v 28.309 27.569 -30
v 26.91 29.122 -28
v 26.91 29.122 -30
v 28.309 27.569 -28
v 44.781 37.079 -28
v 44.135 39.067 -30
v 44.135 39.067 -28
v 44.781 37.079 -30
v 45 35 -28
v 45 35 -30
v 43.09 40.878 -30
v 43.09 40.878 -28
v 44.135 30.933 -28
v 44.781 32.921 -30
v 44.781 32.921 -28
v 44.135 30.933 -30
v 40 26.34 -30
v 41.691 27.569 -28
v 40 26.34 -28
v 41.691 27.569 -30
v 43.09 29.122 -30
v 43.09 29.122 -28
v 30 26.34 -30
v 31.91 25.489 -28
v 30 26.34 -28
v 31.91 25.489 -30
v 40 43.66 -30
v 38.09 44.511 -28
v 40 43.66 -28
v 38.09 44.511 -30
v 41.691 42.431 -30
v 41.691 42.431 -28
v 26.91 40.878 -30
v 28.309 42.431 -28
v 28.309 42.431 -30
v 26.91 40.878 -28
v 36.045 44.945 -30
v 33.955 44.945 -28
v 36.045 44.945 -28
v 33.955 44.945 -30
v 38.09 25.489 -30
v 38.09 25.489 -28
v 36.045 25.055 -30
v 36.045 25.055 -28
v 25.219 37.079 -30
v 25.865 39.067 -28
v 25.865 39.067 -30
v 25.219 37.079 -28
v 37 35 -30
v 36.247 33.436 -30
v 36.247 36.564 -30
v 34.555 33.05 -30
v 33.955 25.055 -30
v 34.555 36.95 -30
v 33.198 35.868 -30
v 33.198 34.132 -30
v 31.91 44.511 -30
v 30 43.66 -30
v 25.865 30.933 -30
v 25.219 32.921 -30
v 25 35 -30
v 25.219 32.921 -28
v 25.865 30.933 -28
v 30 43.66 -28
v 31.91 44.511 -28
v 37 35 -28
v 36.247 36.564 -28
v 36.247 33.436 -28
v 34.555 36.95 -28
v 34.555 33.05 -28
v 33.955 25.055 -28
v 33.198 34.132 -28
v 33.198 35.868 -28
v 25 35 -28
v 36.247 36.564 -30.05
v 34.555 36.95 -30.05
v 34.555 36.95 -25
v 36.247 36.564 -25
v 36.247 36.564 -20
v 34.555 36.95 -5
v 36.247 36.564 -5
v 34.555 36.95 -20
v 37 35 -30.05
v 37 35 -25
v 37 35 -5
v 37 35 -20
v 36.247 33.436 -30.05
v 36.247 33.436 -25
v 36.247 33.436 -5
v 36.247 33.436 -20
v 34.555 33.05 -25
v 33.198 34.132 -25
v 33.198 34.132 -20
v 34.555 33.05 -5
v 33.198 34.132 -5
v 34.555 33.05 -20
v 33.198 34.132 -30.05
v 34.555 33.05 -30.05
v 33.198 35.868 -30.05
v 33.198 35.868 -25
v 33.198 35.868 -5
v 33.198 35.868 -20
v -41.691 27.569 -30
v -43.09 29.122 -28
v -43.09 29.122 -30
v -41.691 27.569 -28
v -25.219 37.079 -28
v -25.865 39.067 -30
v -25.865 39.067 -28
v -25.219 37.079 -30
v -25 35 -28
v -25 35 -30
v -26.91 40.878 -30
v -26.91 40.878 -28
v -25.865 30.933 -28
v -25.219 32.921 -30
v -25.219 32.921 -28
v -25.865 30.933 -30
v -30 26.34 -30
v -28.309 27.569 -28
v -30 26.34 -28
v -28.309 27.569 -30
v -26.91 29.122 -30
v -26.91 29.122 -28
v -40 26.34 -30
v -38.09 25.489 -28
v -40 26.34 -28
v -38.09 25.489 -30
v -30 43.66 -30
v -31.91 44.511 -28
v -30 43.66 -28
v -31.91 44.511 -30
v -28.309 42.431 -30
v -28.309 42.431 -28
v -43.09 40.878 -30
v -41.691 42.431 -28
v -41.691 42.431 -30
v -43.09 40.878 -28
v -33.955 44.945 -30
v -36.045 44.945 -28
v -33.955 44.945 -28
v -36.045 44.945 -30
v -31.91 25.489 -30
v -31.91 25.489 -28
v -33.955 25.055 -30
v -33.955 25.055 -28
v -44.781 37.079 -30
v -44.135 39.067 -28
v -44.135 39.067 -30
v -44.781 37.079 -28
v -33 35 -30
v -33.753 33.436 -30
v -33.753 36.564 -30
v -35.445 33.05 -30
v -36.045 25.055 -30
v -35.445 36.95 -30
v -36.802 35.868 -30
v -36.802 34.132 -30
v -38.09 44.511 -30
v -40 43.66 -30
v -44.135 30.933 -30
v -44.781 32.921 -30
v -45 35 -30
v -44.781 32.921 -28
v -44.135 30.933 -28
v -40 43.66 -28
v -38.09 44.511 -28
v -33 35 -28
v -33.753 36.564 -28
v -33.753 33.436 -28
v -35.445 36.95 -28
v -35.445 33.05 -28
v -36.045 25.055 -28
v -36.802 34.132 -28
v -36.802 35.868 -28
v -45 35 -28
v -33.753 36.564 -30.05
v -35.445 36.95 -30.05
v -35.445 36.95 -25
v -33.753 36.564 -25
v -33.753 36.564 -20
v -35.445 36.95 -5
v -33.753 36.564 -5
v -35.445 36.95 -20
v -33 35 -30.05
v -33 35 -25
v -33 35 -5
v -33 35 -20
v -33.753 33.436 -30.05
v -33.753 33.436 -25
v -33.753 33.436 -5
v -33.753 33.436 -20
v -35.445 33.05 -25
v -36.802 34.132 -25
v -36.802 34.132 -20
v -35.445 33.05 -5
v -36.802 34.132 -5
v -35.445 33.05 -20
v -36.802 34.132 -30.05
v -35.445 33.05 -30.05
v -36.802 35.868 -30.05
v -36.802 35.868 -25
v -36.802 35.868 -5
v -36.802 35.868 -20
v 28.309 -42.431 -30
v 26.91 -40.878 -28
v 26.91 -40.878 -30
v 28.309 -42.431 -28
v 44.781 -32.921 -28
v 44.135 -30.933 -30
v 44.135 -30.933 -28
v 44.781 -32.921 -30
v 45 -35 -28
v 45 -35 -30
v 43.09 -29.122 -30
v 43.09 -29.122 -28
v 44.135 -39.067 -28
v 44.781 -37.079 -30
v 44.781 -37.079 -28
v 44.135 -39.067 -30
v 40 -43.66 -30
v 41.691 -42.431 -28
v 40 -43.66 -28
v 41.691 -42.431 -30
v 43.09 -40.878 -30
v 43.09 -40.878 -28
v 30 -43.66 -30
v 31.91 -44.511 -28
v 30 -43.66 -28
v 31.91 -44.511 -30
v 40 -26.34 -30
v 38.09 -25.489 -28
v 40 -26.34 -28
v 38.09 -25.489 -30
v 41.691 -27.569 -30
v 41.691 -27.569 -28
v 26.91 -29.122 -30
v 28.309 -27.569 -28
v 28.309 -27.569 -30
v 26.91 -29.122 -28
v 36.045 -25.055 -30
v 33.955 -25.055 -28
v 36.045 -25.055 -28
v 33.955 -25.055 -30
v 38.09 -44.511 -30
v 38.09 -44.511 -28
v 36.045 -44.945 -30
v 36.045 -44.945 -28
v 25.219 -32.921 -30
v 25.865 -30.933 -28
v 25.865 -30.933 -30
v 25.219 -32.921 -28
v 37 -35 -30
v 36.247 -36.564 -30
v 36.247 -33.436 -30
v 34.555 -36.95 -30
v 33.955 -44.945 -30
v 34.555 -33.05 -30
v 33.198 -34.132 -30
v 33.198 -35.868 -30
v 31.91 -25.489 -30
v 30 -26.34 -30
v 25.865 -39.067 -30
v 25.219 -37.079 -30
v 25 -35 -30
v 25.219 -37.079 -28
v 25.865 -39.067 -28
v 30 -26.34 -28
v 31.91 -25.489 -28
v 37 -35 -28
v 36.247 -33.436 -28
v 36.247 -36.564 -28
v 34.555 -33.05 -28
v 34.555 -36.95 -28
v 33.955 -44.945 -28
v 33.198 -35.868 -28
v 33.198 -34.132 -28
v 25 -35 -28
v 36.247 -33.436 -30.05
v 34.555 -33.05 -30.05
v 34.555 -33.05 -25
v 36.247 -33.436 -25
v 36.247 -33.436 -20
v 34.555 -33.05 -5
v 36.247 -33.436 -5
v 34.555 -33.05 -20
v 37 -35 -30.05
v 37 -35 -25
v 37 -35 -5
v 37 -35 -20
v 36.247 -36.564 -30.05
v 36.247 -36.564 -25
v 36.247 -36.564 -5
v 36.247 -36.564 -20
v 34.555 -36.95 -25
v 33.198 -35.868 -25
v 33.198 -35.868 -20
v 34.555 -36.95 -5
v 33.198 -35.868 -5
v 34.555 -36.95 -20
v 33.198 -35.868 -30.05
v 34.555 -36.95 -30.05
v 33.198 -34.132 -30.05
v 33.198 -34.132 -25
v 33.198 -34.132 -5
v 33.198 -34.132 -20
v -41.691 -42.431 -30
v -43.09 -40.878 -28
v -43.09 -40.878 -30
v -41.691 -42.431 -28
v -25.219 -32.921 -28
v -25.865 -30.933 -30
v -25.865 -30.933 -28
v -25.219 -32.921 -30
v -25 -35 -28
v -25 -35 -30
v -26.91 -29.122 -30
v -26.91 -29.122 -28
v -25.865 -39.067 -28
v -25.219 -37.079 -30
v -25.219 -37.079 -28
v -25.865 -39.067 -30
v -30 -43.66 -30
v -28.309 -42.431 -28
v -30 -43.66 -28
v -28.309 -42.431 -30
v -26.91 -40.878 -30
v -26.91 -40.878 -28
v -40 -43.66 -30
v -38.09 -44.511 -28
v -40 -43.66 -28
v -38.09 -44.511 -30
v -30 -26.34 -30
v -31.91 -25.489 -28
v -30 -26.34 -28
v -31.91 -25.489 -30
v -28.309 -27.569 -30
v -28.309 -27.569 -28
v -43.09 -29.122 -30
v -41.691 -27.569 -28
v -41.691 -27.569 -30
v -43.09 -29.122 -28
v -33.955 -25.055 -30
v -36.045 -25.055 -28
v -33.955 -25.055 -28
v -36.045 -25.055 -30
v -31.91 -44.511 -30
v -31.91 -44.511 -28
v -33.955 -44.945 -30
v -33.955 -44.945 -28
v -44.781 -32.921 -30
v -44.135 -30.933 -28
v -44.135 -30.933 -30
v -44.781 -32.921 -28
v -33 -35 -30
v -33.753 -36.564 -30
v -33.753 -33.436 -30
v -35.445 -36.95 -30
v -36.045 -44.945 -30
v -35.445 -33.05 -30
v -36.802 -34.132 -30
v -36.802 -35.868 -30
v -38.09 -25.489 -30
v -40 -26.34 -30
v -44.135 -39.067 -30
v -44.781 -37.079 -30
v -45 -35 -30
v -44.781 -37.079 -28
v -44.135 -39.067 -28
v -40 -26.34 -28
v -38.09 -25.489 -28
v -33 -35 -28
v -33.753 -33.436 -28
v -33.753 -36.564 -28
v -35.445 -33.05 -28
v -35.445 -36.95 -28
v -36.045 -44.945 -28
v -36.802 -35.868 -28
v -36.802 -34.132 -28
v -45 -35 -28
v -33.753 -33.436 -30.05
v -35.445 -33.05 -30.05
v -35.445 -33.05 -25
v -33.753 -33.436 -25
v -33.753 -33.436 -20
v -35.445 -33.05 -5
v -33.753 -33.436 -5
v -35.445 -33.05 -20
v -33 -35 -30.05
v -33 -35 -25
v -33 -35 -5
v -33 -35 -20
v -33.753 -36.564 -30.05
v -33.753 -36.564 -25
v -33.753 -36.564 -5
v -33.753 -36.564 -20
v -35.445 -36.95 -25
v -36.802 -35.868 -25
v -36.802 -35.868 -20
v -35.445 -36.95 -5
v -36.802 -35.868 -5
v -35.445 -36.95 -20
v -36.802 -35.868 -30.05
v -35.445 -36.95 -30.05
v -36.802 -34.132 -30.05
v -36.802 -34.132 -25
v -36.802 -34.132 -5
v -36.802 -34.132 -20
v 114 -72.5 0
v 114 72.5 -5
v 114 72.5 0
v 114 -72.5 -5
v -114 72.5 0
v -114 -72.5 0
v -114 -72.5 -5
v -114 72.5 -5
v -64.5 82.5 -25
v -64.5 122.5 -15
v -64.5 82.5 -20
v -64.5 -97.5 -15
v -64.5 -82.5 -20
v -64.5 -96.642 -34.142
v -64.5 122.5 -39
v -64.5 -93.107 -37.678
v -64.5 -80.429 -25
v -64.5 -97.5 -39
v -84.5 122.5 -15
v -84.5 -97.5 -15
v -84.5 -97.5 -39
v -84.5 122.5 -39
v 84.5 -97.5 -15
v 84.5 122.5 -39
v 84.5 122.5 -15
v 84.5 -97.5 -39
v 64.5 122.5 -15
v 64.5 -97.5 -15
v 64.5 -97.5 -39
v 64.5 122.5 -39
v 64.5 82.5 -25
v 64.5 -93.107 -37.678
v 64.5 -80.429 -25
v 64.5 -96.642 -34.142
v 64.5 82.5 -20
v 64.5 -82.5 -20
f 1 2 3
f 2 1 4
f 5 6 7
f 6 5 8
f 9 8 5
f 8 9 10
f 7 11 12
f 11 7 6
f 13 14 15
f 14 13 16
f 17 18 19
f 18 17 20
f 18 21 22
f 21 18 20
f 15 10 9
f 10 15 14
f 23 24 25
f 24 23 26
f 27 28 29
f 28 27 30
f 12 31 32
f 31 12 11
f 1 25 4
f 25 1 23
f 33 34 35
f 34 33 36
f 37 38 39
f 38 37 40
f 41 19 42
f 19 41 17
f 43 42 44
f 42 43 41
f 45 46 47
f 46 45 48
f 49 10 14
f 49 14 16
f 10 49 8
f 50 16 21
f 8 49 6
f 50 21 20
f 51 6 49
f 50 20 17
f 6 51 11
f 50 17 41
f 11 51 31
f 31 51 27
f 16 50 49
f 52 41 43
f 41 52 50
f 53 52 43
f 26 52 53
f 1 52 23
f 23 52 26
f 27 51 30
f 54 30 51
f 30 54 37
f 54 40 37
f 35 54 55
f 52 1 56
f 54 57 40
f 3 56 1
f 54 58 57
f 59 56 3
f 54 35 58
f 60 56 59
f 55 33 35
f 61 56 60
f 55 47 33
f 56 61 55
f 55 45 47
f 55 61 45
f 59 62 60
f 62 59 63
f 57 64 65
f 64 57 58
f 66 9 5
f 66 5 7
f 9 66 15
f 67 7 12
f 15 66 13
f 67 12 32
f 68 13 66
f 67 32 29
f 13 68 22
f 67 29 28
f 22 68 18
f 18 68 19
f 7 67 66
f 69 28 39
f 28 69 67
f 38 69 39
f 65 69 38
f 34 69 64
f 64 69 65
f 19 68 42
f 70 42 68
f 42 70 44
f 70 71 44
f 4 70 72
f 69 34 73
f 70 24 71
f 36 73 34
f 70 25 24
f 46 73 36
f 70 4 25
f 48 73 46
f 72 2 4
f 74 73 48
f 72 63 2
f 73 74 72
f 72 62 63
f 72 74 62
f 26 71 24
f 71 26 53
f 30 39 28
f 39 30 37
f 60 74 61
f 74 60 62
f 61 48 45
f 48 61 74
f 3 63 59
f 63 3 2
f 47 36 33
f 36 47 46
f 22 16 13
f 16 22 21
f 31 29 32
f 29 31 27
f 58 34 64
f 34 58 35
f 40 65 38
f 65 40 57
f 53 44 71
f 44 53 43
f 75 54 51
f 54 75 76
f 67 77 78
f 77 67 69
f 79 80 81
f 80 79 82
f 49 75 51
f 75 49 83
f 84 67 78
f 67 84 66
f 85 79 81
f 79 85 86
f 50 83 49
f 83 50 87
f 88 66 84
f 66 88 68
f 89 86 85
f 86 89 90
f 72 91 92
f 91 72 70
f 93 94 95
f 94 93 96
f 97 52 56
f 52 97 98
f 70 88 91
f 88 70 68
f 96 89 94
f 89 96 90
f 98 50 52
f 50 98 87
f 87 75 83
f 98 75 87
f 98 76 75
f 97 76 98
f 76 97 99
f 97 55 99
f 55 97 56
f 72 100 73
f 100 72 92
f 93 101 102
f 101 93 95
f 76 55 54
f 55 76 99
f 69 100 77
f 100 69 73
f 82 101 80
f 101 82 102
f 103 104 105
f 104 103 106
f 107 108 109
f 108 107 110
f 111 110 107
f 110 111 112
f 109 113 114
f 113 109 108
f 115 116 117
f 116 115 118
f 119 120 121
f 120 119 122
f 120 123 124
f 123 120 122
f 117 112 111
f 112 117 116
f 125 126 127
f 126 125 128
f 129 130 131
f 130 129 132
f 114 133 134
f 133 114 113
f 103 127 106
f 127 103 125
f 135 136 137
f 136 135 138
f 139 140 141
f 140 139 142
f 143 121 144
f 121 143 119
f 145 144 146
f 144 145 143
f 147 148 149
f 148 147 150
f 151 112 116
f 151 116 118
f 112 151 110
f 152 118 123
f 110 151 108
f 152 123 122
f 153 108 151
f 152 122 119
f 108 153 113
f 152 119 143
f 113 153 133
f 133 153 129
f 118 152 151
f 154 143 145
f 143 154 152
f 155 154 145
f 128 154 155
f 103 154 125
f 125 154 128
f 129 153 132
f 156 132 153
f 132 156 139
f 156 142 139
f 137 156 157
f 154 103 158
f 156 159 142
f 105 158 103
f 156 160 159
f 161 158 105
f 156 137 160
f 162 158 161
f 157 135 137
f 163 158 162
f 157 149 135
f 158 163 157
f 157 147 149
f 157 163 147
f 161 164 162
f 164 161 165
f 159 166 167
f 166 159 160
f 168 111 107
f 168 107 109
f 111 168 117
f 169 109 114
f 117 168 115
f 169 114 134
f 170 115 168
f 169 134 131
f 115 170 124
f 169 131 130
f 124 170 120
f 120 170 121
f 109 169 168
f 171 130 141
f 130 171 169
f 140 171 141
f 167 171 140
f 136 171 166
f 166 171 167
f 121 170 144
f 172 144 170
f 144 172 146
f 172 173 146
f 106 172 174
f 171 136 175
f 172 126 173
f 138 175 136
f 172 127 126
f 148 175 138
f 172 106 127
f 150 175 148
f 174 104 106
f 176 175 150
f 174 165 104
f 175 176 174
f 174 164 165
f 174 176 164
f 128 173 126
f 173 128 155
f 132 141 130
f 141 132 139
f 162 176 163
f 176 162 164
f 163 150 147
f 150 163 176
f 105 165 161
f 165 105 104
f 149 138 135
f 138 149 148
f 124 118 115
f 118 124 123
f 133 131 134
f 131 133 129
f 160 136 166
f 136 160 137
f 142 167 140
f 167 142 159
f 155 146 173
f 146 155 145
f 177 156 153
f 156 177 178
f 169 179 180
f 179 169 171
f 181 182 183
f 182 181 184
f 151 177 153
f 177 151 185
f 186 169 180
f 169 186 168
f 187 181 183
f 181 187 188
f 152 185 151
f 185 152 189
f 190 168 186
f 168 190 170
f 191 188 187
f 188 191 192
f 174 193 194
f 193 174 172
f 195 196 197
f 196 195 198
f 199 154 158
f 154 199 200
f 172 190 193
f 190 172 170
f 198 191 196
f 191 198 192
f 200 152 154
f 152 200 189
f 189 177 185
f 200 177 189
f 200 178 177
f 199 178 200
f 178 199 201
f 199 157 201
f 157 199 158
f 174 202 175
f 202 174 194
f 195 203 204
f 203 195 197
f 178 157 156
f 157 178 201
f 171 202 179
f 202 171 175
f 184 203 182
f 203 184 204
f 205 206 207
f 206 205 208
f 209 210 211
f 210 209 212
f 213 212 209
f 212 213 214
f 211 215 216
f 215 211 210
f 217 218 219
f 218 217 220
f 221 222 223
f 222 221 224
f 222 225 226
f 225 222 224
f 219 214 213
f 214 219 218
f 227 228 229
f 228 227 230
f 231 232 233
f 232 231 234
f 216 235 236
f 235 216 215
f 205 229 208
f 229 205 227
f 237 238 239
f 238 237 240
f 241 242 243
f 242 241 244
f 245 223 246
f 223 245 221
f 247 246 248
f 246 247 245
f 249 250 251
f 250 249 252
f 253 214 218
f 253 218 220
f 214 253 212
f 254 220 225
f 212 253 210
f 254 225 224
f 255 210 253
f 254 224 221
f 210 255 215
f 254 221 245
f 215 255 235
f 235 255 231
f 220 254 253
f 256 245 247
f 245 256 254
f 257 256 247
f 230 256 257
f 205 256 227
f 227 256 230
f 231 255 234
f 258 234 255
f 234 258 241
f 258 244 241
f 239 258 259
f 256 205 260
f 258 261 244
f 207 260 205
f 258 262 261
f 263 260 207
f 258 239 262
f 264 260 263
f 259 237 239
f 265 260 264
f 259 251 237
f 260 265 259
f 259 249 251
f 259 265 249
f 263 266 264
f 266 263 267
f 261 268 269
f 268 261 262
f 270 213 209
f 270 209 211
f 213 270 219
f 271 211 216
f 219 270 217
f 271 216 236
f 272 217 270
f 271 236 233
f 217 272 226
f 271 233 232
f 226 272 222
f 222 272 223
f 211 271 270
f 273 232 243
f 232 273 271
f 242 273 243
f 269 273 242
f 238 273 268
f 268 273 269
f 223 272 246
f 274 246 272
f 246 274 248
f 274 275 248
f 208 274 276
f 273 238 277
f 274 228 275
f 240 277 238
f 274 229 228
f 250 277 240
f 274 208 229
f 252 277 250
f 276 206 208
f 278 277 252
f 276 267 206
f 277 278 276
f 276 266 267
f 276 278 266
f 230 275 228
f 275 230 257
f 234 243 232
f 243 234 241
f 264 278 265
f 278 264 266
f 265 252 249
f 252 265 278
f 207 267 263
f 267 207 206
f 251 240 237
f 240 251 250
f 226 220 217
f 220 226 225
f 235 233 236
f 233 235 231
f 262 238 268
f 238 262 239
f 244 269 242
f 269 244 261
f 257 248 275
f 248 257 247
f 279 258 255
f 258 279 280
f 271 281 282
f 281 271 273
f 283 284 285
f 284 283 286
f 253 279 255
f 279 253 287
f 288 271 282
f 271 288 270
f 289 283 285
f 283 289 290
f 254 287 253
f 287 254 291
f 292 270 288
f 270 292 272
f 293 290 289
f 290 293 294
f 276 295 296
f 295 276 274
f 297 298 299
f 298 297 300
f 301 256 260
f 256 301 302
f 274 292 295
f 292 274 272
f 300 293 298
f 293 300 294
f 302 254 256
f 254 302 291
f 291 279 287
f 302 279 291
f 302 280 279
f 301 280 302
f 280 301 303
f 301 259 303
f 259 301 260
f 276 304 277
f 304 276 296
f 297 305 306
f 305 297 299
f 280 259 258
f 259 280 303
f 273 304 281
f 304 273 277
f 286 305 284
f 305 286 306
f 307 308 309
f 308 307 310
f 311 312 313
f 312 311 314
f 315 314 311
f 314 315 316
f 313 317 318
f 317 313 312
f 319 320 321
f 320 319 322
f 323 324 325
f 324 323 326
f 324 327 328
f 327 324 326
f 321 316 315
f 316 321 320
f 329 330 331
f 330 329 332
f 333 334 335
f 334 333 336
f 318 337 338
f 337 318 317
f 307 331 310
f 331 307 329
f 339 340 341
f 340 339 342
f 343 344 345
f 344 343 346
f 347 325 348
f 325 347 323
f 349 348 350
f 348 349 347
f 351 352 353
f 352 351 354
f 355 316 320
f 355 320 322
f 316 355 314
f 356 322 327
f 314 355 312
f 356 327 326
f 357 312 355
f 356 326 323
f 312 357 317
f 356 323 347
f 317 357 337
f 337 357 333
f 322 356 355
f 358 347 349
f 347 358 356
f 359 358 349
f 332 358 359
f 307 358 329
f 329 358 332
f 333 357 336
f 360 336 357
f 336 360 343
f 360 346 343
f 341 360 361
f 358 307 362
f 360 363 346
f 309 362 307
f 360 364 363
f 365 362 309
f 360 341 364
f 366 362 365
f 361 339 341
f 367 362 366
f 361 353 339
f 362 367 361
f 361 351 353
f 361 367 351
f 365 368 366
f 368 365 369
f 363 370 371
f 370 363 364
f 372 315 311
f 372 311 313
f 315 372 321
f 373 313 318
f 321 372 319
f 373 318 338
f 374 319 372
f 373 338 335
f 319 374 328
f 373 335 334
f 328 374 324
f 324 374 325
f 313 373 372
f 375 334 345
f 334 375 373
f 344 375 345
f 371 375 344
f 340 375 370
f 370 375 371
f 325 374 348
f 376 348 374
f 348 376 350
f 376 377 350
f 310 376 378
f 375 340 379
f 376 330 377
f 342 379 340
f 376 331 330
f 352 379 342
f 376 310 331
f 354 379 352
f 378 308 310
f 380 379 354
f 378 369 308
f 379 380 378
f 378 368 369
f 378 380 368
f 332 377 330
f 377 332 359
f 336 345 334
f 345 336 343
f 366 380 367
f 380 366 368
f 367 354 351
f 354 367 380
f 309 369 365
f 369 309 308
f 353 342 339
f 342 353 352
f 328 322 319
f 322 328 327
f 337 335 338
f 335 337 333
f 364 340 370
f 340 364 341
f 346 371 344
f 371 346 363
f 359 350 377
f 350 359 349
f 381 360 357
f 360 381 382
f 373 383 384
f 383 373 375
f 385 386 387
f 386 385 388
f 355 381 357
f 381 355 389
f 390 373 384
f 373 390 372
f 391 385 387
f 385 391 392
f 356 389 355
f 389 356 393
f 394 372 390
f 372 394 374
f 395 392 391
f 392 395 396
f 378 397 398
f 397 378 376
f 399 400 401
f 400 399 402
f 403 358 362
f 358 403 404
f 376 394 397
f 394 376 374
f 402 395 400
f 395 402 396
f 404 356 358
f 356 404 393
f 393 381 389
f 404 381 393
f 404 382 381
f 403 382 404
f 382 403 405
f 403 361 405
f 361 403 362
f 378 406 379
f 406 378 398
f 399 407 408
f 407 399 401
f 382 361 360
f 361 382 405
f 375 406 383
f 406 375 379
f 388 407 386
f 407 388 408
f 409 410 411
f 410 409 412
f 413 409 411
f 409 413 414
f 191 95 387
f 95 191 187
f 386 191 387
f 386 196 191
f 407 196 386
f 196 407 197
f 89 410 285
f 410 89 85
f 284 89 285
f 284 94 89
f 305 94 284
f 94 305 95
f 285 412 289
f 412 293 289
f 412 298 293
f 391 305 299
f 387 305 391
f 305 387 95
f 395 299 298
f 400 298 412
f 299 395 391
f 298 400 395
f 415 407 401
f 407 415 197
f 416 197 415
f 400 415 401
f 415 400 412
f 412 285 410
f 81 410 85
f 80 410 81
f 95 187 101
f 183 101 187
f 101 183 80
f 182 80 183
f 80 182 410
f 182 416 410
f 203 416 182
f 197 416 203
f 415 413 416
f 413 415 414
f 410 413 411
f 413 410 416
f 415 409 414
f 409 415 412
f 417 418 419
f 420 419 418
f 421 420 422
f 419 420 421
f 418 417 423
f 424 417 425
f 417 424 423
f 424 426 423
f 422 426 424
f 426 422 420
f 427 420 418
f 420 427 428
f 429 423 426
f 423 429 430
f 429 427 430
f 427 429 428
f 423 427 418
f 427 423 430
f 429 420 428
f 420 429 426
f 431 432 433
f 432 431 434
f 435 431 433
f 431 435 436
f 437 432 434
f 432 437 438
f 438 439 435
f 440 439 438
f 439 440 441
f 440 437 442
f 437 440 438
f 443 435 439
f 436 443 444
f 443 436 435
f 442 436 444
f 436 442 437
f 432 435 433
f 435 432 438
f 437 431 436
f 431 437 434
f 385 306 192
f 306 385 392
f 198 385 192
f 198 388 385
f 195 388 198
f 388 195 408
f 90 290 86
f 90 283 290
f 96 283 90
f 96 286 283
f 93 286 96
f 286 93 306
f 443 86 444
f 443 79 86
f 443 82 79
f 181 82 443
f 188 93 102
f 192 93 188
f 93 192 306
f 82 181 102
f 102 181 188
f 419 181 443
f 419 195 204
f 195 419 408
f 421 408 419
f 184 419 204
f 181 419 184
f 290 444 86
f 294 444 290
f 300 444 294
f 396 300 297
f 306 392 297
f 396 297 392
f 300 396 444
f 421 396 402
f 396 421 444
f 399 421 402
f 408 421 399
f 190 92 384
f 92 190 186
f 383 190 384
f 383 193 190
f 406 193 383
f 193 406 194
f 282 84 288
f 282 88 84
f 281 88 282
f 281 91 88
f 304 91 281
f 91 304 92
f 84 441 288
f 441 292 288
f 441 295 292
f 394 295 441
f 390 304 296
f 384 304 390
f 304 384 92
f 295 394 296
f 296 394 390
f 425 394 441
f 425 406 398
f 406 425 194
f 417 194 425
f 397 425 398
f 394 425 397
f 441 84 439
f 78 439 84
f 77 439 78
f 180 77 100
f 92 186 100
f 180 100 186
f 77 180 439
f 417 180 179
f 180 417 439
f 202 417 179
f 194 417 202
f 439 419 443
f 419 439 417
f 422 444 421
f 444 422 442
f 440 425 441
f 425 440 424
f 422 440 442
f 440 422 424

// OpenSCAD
// file: Settings.scad
// Mesurements Of Platform Actual & Global Settings
// Mesurements ACTUAL
PlateWidth = 228;
PlateDepth = 145;
PlateHeight = 5;

ArmWidth = 20;
ArmHeight = 24;
ArmForwardProjection = 25;
ArmRearProjection = 50;
ArmVOffset = 15;

BaseWidth = 129;
BaseHeight = 5;
BaseForwardProjection = 10;
BaseRearProjection = 10;
BaseVOffset = 20;

BaseDeflectorLength = 20;
BaseDeflectorAngle = 45;

ScrewsWidthOutset = 35;
ScrewsDepthOutset = 35;
ScrewsHeadRadius = 10;
ScrewsHeadHeight = 2;
ScrewsHeadProtrusion = 5;
ScrewsShaftRadius = 2;
ScrewsHeadCutoutRadius = 2;

RearPlugWidth = 10;
RearPlugHeight = 5;
RearPlugVOffset = 1;

// Options
// ****************************************************************************************************

d = 0.05;   //Delta

ClipSticksize = 8;
PlateThickness = 5;

TensionerBearingRadius = 2;
TensionerOffsetRadius = 15;
TensionerAngle = 45;
TensionerBearingExtention = 3;
TensionerInset = 2;

//lips to keep the belt in
Lip = 3;
//TopLip = 500;
BottomLip = 5;

MidPlateOverlap = 20;
MidPlateOverlapHeight = 10;
MidPlateOverlapOffset = 7;
ClipHoleSize = 5;

LowerPlateCrossover =10;

RollerCore = 2;
RollerClearance = 2;
RollerLength = PlateDepth - 2*RollerClearance;

UpperRollerProjection  = 40;
UpperRollerRadius = 8;

LowerRollerProjection = 20;
LowerRollerRadius = 6;

RollerBearingCutoutRadius = 3;

IbeamProjection = 15;
IbeamPlateThikness = 6;


// Calculated
// ************************************************************************************************************
PlateX = BaseWidth/2;

RollerLength = PlateDepth - 2*RollerClearance;
PlateArmOverhang = PlateWidth/2 - BaseWidth/2  - ArmWidth; 

UpperRollerPlateX = ArmWidth+PlateArmOverhang+UpperRollerProjection-UpperRollerRadius;
UpperRollerPlateY = -UpperRollerRadius; 

LowerRollerPlateX = ArmWidth+PlateArmOverhang+LowerRollerProjection-LowerRollerRadius;
LowerRollerPlateY = -(ArmVOffset+ArmHeight)+LowerRollerRadius;
// main file
// Roller Project Part #1 Front Bracket
include <Settings.scad>;

rig();




module rig(){
//plate
translate( v= [-PlateWidth/2,-PlateDepth/2,-PlateHeight]){
	color("Silver") cube(size=[PlateWidth,PlateDepth,PlateHeight]);
}

//arm
translate( v= [-BaseWidth/2-ArmWidth,-PlateDepth/2-ArmForwardProjection,-ArmVOffset-ArmHeight]){
	color("DimGray") cube(size=[ArmWidth,PlateDepth+ArmForwardProjection+ArmRearProjection,ArmHeight]);
}

//arm
translate( v= [BaseWidth/2,-PlateDepth/2-ArmForwardProjection,-ArmVOffset-ArmHeight]){
	color("DimGray")  cube(size=[ArmWidth,PlateDepth+ArmForwardProjection+ArmRearProjection,ArmHeight]);
}

//base
translate( v= [-BaseWidth/2,-PlateDepth/2-BaseForwardProjection,-BaseVOffset-BaseHeight]){
	color("Gainsboro") cube (size=[BaseWidth,PlateDepth+BaseForwardProjection+BaseRearProjection,BaseHeight]);
}

color("Gainsboro")RigLogoPlate();

translate(v= [ScrewsWidthOutset,ScrewsDepthOutset,-(BaseVOffset+BaseHeight+ScrewsHeadProtrusion)])
color("SlateGray") RigScrew();

translate(v= [-ScrewsWidthOutset,ScrewsDepthOutset,-(BaseVOffset+BaseHeight+ScrewsHeadProtrusion)])
color("SlateGray") RigScrew();

translate(v= [ScrewsWidthOutset,-ScrewsDepthOutset,-(BaseVOffset+BaseHeight+ScrewsHeadProtrusion)])
color("SlateGray") RigScrew();

translate(v= [-ScrewsWidthOutset,-ScrewsDepthOutset,-(BaseVOffset+BaseHeight+ScrewsHeadProtrusion)])
color("SlateGray") RigScrew();


}



module RigScrew(){
	cylinder(h=ScrewsHeadHeight, r=ScrewsHeadRadius );
	cylinder(h=ScrewsHeadHeight, r=ScrewsHeadRadius );
	translate(v = [0,0,-d]){
		cylinder(h=BaseVOffset+BaseHeight+ScrewsHeadProtrusion-d, r=ScrewsShaftRadius );
	}
}



module RigLogoPlate(){
translate( v= [0,-PlateDepth/2-BaseForwardProjection,-BaseVOffset])
rotate(v= [1,0,0], a=BaseDeflectorAngle )
	translate(v=[-BaseWidth/2,-BaseDeflectorLength,-BaseHeight])
		cube(size=[BaseWidth,BaseDeflectorLength,BaseHeight]);


}
